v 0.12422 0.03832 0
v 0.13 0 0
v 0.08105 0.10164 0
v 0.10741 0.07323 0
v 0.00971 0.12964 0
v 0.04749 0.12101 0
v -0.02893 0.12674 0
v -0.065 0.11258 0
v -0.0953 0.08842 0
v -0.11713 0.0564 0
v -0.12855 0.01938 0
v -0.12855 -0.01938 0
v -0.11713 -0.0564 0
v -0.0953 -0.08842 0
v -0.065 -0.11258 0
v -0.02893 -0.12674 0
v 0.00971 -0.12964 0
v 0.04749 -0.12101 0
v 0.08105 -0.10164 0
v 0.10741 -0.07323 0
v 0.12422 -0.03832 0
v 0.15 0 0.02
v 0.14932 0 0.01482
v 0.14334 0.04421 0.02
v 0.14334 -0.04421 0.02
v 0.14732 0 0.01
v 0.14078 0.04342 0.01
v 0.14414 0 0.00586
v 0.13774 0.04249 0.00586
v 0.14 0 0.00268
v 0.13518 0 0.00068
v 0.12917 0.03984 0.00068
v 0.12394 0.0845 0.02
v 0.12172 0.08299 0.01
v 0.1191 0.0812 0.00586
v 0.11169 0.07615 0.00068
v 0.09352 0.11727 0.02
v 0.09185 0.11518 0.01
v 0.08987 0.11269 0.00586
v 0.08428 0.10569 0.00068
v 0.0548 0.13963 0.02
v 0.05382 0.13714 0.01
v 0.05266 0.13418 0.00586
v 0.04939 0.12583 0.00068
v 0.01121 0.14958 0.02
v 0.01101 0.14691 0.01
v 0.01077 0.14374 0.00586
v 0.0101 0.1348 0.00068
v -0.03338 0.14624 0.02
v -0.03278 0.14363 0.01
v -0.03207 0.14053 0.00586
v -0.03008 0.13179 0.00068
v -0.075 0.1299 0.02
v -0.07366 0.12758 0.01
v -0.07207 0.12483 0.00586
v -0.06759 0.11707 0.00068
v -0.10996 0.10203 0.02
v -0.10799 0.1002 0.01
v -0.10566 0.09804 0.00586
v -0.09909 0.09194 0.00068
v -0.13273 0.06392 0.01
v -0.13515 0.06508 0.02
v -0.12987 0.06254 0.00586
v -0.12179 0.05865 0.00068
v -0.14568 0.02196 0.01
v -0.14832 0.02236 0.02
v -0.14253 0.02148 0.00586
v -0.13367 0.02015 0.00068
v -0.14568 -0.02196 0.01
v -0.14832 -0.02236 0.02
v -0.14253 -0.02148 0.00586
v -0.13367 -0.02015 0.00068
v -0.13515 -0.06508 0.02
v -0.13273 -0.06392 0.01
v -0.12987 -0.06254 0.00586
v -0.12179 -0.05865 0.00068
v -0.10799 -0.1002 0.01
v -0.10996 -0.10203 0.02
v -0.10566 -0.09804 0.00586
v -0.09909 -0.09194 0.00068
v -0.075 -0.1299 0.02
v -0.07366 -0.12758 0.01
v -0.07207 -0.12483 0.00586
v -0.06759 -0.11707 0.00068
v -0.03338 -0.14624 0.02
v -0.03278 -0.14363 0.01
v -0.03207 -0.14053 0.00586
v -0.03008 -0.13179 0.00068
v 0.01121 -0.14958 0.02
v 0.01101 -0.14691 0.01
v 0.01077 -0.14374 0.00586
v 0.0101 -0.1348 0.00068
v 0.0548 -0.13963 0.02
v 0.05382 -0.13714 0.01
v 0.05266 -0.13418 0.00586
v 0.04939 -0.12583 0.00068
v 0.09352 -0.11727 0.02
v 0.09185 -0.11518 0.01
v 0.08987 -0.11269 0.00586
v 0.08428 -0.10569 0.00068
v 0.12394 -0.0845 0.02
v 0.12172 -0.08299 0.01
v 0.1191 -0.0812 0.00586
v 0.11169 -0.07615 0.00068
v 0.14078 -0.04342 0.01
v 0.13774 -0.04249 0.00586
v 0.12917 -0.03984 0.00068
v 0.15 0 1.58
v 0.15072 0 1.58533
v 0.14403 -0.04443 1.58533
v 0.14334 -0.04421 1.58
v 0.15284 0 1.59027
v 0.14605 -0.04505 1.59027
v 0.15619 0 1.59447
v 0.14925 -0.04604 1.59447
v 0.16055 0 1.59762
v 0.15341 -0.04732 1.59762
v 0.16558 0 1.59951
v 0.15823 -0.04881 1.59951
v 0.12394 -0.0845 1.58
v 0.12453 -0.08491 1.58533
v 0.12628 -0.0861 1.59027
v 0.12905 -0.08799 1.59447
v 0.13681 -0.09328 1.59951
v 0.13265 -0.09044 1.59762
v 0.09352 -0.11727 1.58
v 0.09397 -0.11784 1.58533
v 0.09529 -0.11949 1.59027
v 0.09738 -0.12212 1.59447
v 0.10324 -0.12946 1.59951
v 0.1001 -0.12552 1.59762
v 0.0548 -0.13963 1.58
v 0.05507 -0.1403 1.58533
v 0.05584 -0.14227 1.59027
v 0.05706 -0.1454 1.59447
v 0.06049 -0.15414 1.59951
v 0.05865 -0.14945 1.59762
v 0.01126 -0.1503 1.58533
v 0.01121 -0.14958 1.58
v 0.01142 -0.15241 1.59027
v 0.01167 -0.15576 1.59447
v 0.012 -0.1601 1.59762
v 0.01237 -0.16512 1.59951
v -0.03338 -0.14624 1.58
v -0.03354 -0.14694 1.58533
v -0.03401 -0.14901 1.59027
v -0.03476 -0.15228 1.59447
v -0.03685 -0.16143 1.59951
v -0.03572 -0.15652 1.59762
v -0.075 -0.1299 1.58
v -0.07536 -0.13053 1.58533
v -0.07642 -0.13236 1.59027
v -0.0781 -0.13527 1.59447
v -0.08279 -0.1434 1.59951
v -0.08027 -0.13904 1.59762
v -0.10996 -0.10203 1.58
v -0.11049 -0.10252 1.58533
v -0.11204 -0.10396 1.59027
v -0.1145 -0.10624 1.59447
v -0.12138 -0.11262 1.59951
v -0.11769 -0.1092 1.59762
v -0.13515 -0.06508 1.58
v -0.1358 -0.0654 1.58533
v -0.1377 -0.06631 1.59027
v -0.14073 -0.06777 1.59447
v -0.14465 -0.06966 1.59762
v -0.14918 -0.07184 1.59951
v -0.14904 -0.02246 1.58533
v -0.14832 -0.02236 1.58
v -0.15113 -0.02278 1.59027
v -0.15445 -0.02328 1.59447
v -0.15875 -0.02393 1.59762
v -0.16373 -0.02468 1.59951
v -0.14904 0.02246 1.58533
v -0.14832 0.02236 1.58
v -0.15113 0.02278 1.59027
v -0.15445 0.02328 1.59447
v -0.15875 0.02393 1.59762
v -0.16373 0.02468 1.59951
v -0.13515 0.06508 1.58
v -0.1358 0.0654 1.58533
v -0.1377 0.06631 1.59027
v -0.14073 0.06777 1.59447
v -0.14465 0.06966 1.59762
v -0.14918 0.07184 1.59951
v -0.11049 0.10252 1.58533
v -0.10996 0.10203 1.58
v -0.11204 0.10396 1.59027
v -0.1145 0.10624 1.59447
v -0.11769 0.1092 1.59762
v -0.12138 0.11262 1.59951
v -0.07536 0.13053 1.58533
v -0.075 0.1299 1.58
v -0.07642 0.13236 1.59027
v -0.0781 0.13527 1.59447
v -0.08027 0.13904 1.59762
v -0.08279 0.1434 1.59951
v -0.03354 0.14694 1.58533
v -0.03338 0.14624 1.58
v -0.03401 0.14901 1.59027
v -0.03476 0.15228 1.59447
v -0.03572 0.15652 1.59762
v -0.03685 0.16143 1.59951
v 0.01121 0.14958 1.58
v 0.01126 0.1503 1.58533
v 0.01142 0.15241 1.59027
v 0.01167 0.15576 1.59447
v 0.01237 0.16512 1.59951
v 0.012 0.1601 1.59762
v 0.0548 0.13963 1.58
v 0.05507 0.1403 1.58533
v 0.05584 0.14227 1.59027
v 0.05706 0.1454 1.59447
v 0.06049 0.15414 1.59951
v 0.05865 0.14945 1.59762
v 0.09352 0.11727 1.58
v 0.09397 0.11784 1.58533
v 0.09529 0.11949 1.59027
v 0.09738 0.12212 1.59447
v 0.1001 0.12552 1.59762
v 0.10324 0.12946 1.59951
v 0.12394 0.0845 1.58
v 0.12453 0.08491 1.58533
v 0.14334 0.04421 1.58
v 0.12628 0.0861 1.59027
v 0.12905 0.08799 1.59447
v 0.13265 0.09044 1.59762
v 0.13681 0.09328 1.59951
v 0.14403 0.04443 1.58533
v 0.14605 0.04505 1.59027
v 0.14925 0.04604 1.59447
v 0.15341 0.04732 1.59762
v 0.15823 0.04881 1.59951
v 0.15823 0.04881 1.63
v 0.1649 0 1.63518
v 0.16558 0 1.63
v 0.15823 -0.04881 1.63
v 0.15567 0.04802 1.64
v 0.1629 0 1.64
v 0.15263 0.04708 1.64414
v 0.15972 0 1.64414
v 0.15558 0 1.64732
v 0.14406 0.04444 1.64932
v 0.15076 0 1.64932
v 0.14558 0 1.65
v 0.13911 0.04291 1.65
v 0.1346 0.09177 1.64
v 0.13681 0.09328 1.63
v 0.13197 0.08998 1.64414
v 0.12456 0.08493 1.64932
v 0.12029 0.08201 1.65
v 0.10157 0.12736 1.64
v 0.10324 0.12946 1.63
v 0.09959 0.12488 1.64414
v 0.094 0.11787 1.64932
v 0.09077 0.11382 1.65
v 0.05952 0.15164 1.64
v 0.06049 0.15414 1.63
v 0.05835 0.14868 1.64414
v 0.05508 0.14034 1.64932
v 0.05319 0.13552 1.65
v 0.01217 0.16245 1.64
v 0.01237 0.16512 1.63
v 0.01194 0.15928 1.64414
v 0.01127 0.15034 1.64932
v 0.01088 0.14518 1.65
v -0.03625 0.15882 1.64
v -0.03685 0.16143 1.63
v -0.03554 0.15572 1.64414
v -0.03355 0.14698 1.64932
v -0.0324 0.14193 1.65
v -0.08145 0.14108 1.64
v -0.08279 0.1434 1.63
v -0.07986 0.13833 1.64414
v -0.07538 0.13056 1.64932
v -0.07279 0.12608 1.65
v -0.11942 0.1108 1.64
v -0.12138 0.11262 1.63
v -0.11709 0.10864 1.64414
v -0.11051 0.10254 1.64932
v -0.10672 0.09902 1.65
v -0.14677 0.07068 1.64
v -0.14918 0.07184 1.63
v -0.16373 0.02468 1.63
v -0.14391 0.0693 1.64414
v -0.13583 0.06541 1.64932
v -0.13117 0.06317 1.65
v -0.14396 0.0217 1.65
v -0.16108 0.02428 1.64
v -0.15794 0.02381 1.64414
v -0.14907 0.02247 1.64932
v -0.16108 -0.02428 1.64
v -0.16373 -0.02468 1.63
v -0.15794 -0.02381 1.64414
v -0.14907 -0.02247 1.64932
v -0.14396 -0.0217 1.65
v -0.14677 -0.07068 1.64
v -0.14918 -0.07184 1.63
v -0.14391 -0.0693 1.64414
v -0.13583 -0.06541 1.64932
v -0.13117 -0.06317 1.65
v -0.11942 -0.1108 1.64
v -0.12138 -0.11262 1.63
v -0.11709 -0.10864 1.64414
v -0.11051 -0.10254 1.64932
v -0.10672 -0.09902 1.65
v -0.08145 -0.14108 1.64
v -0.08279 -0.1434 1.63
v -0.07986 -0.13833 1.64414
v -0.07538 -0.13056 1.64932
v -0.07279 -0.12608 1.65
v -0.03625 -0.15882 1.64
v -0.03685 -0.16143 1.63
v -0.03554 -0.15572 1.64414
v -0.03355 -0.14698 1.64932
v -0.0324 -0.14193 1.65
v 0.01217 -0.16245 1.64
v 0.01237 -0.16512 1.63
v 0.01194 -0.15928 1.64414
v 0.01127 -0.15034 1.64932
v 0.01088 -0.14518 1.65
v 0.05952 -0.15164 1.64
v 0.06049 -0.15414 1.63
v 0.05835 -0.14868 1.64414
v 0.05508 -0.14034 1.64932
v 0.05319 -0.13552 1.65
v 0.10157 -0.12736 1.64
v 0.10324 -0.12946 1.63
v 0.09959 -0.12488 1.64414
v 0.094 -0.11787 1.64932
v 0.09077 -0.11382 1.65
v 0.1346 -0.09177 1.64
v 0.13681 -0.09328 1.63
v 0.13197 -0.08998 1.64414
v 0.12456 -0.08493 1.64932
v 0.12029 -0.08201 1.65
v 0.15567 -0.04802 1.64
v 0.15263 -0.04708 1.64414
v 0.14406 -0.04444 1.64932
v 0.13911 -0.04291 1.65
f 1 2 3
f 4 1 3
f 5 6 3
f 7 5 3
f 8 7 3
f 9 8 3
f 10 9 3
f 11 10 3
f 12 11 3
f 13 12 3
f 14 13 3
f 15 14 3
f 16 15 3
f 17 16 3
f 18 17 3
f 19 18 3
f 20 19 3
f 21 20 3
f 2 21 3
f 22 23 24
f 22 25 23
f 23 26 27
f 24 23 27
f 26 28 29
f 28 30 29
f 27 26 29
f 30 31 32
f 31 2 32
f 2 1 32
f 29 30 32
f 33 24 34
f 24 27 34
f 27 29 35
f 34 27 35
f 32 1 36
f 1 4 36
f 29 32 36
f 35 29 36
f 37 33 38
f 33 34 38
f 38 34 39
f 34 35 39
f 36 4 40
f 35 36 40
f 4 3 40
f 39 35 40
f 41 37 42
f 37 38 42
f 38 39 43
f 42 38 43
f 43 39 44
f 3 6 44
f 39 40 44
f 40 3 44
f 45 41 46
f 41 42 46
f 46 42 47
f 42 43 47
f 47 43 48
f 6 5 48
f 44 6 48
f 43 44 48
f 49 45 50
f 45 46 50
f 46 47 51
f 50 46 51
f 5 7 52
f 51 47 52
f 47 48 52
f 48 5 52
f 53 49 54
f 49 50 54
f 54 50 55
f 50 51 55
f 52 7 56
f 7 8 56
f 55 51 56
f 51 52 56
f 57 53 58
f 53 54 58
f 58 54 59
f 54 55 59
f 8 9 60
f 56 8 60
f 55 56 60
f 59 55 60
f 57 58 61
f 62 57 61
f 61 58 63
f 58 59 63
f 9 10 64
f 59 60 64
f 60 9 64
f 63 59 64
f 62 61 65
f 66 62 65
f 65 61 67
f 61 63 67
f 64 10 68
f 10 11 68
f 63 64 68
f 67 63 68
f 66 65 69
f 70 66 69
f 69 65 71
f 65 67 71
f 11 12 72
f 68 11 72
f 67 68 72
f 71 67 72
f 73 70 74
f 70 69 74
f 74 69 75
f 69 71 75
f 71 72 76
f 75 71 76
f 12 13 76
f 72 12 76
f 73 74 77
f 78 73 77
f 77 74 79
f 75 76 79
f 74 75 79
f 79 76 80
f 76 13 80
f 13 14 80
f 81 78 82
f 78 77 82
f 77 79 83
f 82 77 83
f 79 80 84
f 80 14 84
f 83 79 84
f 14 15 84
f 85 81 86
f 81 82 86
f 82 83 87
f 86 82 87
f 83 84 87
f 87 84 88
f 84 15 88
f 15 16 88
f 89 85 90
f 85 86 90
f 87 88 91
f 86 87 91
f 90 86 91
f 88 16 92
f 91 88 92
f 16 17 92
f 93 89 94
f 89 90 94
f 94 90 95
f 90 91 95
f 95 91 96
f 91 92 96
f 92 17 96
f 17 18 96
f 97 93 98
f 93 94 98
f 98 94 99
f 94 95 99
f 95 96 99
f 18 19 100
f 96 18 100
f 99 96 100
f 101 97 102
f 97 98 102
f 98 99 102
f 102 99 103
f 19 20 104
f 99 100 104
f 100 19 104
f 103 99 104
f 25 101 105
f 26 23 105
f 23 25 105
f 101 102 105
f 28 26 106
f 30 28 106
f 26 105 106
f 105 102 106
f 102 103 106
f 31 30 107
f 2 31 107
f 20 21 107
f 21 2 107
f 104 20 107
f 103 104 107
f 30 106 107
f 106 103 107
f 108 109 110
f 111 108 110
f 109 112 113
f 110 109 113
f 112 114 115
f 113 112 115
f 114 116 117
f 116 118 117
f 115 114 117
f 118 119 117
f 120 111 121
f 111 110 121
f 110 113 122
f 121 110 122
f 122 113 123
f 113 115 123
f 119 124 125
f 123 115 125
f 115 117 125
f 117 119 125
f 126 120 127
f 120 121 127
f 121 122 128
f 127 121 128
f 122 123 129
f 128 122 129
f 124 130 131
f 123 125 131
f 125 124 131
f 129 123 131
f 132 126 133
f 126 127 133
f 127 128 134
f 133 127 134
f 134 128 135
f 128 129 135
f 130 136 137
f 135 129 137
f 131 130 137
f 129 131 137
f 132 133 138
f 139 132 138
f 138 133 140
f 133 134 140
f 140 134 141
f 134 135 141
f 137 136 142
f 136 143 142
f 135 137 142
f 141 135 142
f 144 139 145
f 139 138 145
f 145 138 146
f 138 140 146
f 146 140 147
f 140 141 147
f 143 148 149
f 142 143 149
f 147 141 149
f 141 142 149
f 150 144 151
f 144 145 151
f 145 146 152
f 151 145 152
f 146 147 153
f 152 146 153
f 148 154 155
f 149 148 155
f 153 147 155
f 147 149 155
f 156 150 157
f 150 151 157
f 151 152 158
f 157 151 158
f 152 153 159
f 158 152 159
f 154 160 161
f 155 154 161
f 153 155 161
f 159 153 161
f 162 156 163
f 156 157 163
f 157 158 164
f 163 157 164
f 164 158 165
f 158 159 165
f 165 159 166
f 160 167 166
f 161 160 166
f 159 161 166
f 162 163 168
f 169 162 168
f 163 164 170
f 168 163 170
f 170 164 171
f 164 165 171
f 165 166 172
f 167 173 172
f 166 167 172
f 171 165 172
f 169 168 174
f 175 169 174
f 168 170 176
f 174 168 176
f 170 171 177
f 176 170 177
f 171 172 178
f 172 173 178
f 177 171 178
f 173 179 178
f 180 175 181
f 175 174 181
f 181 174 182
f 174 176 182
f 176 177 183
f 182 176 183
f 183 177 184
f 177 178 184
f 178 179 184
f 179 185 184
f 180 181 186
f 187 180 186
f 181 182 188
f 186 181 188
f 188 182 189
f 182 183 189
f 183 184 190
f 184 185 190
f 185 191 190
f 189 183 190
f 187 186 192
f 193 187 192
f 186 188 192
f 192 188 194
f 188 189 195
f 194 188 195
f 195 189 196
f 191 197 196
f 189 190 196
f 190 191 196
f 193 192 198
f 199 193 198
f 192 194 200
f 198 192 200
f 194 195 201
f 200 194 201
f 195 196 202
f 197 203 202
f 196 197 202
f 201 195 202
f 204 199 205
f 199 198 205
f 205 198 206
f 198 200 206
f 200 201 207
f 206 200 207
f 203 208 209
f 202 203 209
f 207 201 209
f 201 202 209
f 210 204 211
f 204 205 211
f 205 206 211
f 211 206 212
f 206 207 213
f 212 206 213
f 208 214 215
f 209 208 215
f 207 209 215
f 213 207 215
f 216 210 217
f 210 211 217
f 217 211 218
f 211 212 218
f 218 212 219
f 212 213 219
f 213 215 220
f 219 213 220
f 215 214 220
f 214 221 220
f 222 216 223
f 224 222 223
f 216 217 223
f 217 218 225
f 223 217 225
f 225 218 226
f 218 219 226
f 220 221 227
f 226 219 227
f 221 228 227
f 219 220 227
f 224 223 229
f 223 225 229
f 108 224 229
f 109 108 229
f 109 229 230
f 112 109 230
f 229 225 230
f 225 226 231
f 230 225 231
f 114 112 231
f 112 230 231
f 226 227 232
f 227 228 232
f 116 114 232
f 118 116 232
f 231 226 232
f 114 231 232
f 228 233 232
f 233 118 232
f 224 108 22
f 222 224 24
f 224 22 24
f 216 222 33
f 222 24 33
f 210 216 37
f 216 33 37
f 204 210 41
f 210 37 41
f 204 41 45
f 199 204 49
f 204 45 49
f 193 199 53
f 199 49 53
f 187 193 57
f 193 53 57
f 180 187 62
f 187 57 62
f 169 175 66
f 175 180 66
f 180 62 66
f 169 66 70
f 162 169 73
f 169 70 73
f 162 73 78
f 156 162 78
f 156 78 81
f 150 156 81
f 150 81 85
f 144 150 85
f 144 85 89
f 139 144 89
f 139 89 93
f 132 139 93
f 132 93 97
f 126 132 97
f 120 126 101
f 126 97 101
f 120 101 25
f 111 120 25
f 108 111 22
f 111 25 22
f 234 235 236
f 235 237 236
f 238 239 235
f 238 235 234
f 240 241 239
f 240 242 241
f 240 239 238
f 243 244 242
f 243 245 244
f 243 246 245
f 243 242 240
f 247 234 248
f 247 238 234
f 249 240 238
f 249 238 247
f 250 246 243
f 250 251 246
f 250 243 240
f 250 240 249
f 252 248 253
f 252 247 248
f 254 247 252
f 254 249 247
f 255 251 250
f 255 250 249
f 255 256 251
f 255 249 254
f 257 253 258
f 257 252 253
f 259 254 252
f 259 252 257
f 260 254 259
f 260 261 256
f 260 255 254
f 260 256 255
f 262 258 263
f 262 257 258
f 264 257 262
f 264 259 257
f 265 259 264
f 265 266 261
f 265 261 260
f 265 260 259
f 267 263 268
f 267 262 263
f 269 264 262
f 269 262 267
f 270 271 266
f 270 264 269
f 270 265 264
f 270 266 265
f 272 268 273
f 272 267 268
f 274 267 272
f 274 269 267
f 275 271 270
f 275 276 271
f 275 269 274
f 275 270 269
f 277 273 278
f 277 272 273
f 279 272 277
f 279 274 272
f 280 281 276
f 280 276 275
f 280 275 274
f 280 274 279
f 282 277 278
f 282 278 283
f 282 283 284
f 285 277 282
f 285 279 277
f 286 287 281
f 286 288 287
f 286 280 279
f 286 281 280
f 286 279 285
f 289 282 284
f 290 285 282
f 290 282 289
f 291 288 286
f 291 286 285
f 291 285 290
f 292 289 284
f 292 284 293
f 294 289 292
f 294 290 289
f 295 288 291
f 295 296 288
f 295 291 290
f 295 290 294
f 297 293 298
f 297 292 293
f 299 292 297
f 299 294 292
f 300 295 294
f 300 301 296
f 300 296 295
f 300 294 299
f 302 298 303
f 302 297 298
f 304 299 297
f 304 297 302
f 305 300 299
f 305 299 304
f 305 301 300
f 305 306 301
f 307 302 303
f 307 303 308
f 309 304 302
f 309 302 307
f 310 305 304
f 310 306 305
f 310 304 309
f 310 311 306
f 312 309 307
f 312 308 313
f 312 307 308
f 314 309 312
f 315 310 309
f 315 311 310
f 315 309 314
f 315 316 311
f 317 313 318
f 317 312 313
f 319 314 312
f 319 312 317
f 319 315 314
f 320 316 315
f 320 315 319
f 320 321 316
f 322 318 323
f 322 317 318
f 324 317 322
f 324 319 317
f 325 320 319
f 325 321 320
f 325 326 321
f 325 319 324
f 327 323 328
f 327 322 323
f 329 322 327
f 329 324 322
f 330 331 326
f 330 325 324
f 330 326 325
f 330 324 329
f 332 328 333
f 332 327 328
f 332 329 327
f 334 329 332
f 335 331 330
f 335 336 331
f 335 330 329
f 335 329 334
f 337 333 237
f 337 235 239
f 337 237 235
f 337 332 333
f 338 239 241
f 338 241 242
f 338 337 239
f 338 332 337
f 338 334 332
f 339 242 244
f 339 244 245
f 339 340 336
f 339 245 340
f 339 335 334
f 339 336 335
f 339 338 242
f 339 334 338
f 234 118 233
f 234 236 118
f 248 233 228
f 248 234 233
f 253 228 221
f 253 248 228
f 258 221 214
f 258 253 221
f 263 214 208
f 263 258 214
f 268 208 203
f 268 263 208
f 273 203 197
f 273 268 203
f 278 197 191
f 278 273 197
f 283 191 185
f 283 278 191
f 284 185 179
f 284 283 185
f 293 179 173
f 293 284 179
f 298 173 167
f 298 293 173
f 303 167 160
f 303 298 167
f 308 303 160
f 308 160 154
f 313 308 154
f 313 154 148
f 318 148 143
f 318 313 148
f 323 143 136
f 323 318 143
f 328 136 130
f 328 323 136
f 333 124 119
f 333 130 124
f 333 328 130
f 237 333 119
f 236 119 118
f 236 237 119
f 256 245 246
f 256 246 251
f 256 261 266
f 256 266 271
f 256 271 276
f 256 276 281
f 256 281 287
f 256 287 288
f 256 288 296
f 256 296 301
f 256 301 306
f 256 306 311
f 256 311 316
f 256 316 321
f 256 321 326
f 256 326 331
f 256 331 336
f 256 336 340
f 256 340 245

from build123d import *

# Parameters (mm, degrees)
SKETCH1_R           = 0.15
BOSS_EXTRUDE1_DEPTH = 1.65
SKETCH2_R           = 0.165582224
BOSS_EXTRUDE2_DEPTH = 0.05
FILLET1_R           = 0.02
FILLET2_R           = 0.02
FILLET3_R           = 0.02


with BuildPart() as part:
    # Sketch1 → Boss-Extrude1 (new body)
    with BuildSketch(Plane.XY):
        Circle(SKETCH1_R)
    extrude(amount=BOSS_EXTRUDE1_DEPTH)

    # Sketch2 → Boss-Extrude2 (add)
    with BuildSketch(Plane.XY.offset(1.65)):
        Circle(SKETCH2_R)
    extrude(amount=-BOSS_EXTRUDE2_DEPTH)

    # Fillet1
    fillet1_edges = [part.edges().sort_by_distance(p)[0] for p in [
        (-0.165582224, 0, 1.65),
    ]]
    fillet(fillet1_edges, radius=FILLET1_R)

    # Fillet2
    # the kernel refuses this fillet: 0.02 mm, written as the material it adds along each edge
    with BuildSketch(Plane(origin=(0, 0, 1.6), x_dir=(1, 0, 0), z_dir=(0, 1, 0))) as fillet2_piece_1_section:
        with BuildLine():
            CenterArc((0.15 + FILLET2_R, FILLET2_R), FILLET2_R, 180, 90)
            Line((0.15, FILLET2_R), (0.15, 0))
            Line((0.15, 0), (0.15 + FILLET2_R, 0))
        make_face()
    fillet2_piece_1 = revolve(axis=Axis((0, 0, 1.6), (0, 0, -1)), mode=Mode.PRIVATE)
    fillet2_piece_1 = fillet2_piece_1 & Plane(origin=(0, 0, 1.592769075), x_dir=(1, 0, 0), z_dir=(0, 0, 1)) * Cylinder(0.165582224, 1, mode=Mode.PRIVATE)
    add(fillet2_piece_1)

    # Fillet3
    fillet3_edges = [part.edges().sort_by_distance(p)[0] for p in [
        (-0.15, 0, 0),
    ]]
    fillet(fillet3_edges, radius=FILLET3_R)


solid = part.part
